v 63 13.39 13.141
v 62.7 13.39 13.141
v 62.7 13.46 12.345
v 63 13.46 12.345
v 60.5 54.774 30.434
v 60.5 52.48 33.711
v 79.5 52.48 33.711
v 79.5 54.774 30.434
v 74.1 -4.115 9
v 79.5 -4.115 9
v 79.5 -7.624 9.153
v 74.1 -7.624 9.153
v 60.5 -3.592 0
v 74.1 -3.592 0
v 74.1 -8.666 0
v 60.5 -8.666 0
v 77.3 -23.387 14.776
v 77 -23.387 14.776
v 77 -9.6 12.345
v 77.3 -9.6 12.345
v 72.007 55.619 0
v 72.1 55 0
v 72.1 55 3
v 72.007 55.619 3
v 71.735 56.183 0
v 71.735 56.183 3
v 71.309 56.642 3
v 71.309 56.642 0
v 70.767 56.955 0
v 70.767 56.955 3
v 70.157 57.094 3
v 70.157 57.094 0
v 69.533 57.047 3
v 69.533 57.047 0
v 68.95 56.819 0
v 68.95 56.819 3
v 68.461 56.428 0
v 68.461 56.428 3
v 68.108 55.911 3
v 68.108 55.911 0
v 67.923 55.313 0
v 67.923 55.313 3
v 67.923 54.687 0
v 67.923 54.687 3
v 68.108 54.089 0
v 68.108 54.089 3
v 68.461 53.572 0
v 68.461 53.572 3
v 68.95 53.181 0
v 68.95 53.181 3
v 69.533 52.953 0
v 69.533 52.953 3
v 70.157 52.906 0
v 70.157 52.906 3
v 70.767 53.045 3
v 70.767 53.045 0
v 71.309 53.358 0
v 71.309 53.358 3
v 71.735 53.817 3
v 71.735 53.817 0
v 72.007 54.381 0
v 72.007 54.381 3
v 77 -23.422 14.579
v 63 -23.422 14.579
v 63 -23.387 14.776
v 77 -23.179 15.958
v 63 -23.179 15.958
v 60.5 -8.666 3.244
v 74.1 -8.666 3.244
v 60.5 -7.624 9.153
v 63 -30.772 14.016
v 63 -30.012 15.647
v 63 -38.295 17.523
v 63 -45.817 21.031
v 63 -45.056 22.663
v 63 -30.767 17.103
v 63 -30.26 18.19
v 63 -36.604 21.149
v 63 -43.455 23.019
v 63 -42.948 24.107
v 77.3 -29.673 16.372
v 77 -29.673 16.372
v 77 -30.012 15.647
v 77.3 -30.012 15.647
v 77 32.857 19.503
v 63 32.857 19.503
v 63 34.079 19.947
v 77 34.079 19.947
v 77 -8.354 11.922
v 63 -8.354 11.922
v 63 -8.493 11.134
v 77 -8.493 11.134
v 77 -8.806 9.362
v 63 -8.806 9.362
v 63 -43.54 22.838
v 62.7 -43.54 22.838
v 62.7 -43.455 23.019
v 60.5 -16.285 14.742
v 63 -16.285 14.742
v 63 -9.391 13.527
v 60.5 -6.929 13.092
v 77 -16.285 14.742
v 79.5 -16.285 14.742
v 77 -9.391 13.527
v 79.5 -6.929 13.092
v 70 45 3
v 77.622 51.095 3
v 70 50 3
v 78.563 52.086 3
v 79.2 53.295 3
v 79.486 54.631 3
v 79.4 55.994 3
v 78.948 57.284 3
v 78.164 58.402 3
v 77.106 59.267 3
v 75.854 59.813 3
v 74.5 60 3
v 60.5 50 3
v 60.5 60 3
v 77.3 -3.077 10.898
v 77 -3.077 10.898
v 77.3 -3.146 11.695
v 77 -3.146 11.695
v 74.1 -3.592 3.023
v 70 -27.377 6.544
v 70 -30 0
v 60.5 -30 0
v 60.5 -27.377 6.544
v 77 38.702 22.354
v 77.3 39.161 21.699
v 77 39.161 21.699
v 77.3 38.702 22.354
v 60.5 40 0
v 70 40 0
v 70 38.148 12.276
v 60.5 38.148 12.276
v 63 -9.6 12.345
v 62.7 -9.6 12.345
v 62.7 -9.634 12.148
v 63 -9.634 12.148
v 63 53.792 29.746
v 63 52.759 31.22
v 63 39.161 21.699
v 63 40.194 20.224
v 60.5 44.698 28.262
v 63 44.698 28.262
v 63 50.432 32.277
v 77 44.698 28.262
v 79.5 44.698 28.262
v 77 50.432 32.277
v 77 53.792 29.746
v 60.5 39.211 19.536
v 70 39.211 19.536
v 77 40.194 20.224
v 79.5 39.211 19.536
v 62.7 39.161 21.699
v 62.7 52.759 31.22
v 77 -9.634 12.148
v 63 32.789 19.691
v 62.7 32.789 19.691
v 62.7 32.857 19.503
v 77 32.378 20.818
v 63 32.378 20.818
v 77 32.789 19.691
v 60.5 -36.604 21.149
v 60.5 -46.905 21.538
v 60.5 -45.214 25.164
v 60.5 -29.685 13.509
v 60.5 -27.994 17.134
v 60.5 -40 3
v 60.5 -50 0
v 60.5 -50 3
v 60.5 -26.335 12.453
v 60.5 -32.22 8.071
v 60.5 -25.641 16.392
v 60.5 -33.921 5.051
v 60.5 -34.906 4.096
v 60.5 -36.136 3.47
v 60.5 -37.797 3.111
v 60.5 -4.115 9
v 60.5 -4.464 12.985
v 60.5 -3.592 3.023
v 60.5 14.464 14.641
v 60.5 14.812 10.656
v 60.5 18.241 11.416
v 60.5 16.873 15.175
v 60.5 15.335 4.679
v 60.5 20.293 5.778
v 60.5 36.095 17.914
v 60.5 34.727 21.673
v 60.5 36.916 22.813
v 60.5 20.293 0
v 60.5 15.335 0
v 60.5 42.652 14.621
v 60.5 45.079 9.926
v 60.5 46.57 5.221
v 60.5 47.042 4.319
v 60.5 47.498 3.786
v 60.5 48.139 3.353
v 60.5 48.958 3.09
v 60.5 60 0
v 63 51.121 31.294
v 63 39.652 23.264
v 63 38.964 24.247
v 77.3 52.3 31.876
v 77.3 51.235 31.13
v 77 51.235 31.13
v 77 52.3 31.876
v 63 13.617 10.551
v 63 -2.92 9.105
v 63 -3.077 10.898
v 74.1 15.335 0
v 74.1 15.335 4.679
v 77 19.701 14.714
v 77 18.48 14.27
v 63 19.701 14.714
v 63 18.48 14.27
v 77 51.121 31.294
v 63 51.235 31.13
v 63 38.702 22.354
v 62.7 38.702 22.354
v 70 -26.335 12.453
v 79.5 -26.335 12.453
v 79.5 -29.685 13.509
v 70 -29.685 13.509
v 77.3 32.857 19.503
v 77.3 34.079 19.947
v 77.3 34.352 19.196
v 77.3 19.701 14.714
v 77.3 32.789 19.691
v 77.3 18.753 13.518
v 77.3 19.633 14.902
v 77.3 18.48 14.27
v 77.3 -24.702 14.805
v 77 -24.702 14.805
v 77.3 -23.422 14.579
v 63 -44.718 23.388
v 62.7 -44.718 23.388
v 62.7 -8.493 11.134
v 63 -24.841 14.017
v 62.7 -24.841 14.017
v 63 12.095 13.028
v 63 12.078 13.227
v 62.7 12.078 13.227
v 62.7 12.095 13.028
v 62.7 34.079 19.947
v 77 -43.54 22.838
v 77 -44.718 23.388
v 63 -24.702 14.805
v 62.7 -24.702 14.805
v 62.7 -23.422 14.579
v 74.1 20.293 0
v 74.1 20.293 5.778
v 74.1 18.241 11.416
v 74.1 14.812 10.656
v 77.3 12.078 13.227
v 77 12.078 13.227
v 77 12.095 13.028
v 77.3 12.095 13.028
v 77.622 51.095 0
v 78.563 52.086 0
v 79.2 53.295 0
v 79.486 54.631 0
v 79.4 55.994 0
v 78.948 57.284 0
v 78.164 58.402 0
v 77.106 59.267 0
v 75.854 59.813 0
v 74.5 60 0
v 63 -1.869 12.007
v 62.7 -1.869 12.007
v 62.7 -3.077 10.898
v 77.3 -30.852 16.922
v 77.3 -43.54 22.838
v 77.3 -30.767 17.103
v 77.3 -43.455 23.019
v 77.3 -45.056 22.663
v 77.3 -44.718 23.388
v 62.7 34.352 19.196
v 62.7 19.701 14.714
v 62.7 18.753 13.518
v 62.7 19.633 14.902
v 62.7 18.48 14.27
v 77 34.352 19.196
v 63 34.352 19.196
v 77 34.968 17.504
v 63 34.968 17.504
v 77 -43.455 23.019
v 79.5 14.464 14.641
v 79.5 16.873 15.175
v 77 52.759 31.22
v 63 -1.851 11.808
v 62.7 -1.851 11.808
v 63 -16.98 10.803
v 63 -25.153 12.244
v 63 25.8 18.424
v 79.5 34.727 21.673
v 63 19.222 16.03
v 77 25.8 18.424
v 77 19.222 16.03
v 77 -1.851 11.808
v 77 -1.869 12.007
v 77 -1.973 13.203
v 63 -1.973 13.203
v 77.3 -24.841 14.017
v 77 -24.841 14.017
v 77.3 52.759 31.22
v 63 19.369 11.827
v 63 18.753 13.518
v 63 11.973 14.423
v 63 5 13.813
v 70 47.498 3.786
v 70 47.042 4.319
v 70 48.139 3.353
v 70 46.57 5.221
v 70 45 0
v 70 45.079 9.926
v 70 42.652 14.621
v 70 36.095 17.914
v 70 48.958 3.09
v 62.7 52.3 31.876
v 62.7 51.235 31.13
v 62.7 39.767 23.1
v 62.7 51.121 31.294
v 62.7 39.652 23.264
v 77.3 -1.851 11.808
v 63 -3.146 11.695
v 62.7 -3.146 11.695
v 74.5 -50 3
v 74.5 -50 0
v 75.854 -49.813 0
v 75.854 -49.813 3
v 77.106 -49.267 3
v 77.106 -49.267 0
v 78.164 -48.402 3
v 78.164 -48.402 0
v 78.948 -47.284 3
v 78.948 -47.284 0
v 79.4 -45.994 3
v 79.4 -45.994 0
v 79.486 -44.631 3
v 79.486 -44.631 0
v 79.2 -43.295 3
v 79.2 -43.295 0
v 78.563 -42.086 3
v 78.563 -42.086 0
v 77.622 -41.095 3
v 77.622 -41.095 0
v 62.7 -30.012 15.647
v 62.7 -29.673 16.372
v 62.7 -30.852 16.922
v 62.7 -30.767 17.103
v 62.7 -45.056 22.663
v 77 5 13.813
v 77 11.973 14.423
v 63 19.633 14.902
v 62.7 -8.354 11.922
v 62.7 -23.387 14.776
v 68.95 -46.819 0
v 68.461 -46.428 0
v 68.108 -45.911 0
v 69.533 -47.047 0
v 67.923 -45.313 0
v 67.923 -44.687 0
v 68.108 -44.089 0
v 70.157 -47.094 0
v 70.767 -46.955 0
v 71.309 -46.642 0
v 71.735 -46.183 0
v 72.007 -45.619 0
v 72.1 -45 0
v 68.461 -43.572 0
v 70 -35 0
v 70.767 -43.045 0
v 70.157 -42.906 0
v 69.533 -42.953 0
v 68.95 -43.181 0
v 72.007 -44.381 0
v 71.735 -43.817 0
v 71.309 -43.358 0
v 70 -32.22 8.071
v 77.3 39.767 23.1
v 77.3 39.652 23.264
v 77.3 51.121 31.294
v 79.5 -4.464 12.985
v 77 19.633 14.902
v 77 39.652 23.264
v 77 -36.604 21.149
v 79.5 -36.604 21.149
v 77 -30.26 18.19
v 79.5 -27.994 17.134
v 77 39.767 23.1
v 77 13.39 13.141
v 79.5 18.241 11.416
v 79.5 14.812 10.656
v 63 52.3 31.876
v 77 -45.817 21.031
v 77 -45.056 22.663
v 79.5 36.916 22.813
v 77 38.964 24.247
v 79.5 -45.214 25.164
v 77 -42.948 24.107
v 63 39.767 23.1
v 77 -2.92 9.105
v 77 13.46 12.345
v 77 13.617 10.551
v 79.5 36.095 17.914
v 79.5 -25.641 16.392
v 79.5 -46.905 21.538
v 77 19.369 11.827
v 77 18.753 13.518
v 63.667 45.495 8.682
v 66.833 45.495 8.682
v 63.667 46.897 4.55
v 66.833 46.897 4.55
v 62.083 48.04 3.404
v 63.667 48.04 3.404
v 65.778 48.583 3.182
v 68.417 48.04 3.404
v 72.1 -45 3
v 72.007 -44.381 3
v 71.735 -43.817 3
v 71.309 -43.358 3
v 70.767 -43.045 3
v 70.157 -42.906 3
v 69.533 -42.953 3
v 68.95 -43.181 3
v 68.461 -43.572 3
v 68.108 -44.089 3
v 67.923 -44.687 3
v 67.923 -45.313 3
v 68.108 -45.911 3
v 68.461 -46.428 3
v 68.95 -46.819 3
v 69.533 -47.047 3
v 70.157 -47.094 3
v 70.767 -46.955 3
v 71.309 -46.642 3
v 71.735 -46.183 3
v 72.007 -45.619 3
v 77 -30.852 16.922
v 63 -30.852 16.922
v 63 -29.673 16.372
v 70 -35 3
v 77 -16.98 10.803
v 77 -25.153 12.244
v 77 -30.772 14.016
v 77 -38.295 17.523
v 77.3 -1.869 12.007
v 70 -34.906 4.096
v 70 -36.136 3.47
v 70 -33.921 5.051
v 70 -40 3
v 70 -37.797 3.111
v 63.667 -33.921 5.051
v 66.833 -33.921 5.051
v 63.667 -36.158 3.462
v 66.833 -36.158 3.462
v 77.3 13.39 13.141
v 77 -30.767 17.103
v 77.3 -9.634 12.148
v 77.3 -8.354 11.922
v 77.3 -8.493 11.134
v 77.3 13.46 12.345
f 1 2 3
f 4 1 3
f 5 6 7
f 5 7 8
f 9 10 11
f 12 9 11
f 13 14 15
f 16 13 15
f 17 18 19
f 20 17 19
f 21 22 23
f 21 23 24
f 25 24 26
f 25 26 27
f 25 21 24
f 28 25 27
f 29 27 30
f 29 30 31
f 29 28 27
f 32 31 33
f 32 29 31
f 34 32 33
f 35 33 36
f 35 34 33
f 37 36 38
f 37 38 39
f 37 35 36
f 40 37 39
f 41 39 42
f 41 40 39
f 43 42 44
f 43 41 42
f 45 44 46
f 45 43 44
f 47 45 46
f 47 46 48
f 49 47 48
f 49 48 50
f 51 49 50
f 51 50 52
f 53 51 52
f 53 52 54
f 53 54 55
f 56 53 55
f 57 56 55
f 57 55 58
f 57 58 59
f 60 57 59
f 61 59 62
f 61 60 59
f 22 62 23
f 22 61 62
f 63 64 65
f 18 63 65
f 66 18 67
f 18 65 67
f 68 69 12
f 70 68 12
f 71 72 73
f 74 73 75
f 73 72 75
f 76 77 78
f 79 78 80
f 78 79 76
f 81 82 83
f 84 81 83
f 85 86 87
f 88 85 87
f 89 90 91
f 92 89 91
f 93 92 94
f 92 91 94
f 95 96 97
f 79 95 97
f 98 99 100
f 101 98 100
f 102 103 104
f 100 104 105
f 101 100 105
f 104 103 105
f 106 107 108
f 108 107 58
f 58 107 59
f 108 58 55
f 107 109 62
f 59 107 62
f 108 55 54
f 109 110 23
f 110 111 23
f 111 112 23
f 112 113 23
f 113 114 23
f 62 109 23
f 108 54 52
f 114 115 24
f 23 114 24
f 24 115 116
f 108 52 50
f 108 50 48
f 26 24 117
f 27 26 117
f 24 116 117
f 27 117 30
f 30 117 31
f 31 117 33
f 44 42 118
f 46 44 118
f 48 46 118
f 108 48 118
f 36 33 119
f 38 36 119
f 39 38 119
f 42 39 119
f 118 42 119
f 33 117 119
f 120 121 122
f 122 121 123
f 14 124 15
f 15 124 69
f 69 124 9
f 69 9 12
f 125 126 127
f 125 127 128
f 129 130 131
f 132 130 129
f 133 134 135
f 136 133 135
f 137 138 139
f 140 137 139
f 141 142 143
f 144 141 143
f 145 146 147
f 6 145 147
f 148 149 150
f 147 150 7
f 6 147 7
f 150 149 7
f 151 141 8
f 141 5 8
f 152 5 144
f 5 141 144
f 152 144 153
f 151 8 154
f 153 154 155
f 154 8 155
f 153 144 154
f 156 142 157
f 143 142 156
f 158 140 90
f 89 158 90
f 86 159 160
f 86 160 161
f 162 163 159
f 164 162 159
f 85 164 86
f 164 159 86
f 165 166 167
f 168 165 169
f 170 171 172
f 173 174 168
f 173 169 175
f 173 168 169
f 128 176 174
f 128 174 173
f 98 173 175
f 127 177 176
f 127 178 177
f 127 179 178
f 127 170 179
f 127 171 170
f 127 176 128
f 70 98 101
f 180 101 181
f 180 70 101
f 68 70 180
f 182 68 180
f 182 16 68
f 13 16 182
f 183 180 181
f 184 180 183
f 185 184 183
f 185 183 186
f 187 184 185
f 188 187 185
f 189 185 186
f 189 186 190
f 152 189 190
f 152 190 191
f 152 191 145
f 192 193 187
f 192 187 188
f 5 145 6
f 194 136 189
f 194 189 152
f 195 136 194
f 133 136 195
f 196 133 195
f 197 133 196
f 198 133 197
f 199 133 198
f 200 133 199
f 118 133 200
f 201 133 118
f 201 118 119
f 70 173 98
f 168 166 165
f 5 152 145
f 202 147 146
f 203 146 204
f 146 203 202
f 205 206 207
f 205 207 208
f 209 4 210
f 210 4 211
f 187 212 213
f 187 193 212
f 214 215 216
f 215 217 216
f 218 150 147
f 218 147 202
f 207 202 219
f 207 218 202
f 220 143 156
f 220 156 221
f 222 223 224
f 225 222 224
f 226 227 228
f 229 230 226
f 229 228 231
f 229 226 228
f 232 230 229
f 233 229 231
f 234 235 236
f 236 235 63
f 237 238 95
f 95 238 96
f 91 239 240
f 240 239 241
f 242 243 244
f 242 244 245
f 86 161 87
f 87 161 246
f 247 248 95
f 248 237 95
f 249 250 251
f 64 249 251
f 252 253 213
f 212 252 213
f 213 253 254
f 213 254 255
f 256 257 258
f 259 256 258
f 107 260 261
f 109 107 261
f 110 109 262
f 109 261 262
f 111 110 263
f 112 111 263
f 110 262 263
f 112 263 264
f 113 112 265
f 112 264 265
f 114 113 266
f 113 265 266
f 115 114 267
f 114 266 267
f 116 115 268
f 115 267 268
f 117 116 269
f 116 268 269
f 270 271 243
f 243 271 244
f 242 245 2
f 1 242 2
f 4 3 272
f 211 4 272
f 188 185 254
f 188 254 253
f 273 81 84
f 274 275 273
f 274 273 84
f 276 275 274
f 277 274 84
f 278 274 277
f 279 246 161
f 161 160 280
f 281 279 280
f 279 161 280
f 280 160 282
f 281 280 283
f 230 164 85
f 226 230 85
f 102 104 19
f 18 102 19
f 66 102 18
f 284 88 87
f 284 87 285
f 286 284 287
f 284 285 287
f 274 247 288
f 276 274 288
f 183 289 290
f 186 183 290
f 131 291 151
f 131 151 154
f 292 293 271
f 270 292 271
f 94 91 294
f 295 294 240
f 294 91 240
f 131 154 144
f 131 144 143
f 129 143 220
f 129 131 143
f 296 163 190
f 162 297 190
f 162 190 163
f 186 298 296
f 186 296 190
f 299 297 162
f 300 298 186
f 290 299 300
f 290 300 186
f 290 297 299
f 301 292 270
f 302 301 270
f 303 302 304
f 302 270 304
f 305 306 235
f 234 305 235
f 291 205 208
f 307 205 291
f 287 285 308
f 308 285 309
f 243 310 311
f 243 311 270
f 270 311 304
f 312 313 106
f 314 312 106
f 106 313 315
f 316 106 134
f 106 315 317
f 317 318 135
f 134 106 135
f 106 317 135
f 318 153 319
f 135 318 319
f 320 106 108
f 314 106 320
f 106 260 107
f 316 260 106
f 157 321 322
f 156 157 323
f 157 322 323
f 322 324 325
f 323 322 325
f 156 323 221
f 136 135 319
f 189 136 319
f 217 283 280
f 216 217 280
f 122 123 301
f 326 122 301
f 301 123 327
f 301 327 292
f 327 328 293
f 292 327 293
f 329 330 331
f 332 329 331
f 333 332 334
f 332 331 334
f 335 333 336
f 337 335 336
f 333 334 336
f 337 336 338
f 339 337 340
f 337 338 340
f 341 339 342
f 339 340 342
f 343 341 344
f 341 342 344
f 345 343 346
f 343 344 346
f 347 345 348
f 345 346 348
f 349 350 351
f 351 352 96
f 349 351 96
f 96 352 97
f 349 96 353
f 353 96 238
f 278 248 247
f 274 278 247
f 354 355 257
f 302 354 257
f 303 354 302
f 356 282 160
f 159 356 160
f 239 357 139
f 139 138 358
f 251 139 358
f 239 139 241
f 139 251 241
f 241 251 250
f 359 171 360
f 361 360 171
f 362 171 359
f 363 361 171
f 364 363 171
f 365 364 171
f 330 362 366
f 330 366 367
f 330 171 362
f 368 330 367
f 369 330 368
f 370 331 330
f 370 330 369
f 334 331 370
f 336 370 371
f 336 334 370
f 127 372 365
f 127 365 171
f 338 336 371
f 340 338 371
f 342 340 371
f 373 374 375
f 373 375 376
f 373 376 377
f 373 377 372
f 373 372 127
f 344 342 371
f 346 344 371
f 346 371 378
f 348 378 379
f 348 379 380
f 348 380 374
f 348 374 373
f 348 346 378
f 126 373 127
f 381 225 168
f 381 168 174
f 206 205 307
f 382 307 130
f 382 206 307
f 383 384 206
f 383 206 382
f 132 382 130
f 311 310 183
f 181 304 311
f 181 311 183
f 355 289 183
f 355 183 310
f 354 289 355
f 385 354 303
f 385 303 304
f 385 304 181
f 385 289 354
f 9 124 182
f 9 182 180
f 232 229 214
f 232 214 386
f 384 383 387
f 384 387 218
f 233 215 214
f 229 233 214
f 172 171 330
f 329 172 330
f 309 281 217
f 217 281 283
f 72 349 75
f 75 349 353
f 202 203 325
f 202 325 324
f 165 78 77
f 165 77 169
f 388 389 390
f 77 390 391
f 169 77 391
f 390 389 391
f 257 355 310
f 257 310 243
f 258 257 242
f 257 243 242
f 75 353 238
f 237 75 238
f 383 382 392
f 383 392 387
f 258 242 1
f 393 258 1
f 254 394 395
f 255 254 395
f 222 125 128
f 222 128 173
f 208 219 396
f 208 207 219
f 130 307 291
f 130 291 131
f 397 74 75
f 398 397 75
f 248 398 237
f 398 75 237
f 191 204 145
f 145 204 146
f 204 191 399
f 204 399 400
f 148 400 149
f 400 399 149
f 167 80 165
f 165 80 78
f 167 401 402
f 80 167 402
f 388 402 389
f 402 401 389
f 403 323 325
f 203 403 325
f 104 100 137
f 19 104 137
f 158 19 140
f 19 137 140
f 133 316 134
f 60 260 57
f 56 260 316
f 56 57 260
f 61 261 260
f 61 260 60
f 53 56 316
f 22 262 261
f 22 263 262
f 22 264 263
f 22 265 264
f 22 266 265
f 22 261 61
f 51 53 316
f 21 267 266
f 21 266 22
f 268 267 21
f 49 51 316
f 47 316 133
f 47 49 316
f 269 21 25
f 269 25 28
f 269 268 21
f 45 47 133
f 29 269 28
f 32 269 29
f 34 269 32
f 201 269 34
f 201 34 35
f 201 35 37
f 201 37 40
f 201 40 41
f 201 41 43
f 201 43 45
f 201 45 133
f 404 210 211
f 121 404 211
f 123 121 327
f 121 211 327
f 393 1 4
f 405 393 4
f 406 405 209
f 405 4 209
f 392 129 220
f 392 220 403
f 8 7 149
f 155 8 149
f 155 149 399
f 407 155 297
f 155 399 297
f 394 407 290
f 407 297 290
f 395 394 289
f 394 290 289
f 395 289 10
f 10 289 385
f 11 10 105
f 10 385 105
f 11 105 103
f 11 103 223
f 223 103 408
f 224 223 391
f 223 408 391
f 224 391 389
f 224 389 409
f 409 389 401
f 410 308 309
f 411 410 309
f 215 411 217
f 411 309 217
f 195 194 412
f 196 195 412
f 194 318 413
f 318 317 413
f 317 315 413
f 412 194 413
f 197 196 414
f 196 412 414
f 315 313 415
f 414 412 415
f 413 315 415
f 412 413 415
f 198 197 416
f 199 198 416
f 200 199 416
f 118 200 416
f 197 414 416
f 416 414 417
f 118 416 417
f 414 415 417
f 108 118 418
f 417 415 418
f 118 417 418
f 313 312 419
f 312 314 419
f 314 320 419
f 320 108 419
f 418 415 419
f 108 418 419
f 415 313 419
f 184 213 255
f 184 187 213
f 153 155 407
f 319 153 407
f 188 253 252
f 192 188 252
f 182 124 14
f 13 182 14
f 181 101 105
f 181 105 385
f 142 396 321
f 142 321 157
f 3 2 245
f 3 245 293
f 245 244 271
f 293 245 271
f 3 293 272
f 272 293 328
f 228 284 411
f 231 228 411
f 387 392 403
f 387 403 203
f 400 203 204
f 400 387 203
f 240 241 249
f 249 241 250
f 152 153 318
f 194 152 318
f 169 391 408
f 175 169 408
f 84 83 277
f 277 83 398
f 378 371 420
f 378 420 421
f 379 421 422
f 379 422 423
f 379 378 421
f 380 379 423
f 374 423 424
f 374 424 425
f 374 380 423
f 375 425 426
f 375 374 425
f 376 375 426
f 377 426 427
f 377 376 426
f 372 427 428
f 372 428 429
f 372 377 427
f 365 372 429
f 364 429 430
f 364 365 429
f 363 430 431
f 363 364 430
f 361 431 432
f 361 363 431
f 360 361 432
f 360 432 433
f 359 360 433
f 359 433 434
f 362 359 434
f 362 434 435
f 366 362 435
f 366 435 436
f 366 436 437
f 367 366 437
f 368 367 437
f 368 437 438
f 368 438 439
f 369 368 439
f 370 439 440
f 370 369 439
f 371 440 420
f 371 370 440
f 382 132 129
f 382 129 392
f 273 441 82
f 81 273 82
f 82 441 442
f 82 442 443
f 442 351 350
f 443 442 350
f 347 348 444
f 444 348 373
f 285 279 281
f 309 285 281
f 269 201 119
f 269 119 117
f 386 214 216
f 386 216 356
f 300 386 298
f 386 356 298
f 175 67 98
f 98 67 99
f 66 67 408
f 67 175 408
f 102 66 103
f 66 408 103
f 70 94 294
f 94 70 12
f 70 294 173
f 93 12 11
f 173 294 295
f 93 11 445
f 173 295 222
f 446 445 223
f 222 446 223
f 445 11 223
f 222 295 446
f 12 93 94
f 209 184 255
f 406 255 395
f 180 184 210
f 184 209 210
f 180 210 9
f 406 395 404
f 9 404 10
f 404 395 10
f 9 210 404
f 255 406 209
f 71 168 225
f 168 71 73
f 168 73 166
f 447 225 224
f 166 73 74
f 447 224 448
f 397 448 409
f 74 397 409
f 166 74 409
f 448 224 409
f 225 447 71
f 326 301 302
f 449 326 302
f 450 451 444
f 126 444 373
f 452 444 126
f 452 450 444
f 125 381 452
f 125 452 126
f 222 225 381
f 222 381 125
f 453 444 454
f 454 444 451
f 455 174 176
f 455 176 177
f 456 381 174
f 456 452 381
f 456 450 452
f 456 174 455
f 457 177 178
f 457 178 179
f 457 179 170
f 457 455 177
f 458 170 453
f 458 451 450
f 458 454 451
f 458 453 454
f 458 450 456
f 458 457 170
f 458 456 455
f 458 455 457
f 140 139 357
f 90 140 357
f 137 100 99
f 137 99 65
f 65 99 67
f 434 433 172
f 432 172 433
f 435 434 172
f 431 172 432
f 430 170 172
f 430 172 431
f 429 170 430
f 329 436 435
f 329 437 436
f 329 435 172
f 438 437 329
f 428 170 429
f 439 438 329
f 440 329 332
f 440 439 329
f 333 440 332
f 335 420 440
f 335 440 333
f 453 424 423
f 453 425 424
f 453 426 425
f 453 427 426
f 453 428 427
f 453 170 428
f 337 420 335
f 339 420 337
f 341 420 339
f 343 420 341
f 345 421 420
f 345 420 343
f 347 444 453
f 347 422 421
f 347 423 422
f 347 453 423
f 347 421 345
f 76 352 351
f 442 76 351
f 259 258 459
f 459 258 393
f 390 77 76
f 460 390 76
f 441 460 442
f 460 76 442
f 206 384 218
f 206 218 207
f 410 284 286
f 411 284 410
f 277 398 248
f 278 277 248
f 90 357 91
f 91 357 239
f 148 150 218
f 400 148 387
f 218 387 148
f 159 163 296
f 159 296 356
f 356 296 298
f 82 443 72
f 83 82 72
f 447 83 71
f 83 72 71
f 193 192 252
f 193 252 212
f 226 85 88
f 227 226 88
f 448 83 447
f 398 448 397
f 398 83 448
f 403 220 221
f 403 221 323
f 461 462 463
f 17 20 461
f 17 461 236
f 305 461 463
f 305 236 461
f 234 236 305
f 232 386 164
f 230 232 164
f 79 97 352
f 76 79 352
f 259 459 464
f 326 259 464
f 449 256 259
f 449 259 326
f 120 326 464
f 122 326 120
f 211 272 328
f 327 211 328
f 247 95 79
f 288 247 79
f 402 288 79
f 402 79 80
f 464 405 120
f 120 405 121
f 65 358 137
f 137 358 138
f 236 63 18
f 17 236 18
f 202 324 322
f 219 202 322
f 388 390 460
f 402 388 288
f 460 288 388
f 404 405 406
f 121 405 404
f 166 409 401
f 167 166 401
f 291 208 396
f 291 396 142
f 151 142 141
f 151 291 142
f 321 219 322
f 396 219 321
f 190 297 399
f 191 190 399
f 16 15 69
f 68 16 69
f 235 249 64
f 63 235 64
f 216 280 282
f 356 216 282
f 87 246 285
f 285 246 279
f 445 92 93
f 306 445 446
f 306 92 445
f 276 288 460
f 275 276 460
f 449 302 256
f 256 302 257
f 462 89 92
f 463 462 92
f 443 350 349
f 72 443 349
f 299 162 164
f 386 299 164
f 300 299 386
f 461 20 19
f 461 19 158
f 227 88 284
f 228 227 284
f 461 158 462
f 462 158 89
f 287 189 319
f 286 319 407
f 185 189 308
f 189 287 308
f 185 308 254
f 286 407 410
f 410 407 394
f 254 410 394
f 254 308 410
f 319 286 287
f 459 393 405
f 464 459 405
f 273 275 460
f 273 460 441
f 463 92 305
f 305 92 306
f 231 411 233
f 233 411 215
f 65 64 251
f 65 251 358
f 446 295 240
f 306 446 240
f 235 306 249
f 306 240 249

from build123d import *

# Parameters (mm, degrees)
PAD012_DEPTH      = 9.5
POCKET006_DEPTH   = 7
POCKET007_DEPTH   = 7.3
PAD013_DEPTH      = 4.1
PAD013_DEPTH_BACK = 9.5
PAD014_DEPTH      = 9.5
SKETCH025_R       = 2.1
PAD015_DEPTH      = 3


with BuildPart() as part:
    # Sketch020 → Pad012 (new body, symmetric)
    with BuildSketch(Plane.YZ):
        Polygon((-50.2140974459, 25.1635701277), (-41.604173469, 21.1486966411), (-32.9942494922, 17.1338231546), (-30.6406576873, 16.391738509), (-21.2849840337, 14.7420808212), (-11.9293103801, 13.0924231333), (-9.4638496319, 12.9847787924), (0, 13.8127583485), (9.4638496319, 14.6407379046), (11.8731622478, 15.1748696522), (20.8002421453, 18.4240610138), (29.7273220428, 21.6732523754), (31.9162958532, 22.8127600156), (39.698240274, 28.2617361609), (47.4801846947, 33.7107123063), (49.7744904401, 30.4341041291), (34.2106015986, 19.5361518385), (31.0954026161, 17.9144818922), (13.2412428211, 11.416099169), (9.8124726029, 10.6559591122), (-9.1152266609, 9), (-12.6239030908, 9.1531921213), (-31.335250398, 12.452507497), (-34.6847225392, 13.5085920065), (-51.9045704929, 21.5383389795), align=None)
    extrude(amount=PAD012_DEPTH, both=True)

    # Sketch021 → Pocket006 (cut, symmetric)
    with BuildSketch(Plane.YZ):
        Polygon((-47.9483279783, 24.1070244733), (-41.604173469, 21.1486966411), (-35.2600189598, 18.190368809), (-35.8516845262, 16.9215379071), (-34.6734844031, 16.3721341668), (-35.7722918836, 14.0157339205), (-43.294646516, 17.523465493), (-50.8170011484, 21.0311970654), (-49.7181936679, 23.3875973117), (-48.5399935447, 22.8381935715), align=None)
        Polygon((-30.1534810944, 12.2441296838), (-29.7019958324, 14.8046298416), (-28.4217457535, 14.5788872106), (-28.1786383048, 15.9576180648), (-21.2849840337, 14.7420808212), (-14.3913297626, 13.5265435775), (-14.6344372114, 12.1478127233), (-13.3541871324, 11.9220700923), (-13.8056723944, 9.3615699345), (-21.9795767444, 10.8028498091), align=None)
        Polygon((-8.1463979543, 11.6946931063), (-6.8513448468, 11.8079955719), (-6.9733628866, 13.2026681492), (0, 13.8127583485), (6.9733628866, 14.4228485477), (7.0953809265, 13.0281759704), (8.390434034, 13.1414784359), (8.6170389652, 10.5513722209), (0.348622971, 9.8279795561), (-7.9197930232, 9.1045868913), align=None)
        Polygon((14.2223937998, 16.0299200105), (20.8002421453, 18.4240610138), (27.3780904908, 20.818202017), (27.8569186914, 19.5026323479), (29.0785190985, 19.9472585343), (29.9677714711, 17.5040577202), (22.1683227186, 14.6652905306), (14.3688739661, 11.826523341), (13.4796215934, 14.2697241551), (14.7012220004, 14.7143503414), align=None)
        Polygon((33.7022853173, 22.3542388772), (34.7671829748, 23.0998882445), (33.964175964, 24.2467011065), (39.698240274, 28.2617361609), (45.432304584, 32.2767712154), (46.2353115949, 31.1299583534), (47.3002092525, 31.8756077207), (48.791507987, 29.7458124055), (41.9925460194, 24.9851279838), (35.1935840518, 20.2244435621), align=None)
    extrude(amount=POCKET006_DEPTH, both=True, mode=Mode.SUBTRACT)

    # Sketch022 → Pocket007 (cut, symmetric)
    with BuildSketch(Plane.YZ):
        Polygon((-48.4554698924, 23.0194551289), (-35.7671608739, 17.1027994645), (-35.8516845262, 16.9215379071), (-34.6734844031, 16.3721341668), (-35.0115790125, 15.6470879372), (-50.0562882773, 22.6625510822), (-49.7181936678, 23.3875973117), (-48.5399935447, 22.8381935715), align=None)
        Polygon((-28.387016118, 14.7758487612), (-14.5997075758, 12.3447742739), (-14.6344372114, 12.1478127233), (-13.3541871325, 11.9220700923), (-13.4931056746, 11.1342238899), (-29.8409143746, 14.0167836392), (-29.7019958324, 14.8046298416), (-28.4217457535, 14.5788872107), align=None)
        Polygon((-6.8687759954, 12.0072345116), (7.077949778, 13.2274149099), (7.0953809265, 13.0281759703), (8.390434034, 13.1414784359), (8.4601586282, 12.3445226773), (-8.0766733601, 10.8977373481), (-8.1463979543, 11.6946931063), (-6.8513448468, 11.8079955719), align=None)
        Polygon((14.6328179716, 14.9022888661), (27.788514663, 19.6905708716), (27.8569186915, 19.5026323479), (29.0785190985, 19.9472585342), (29.3521352133, 19.1955044372), (13.7532377079, 13.5179700589), (13.4796215934, 14.269724155), (14.7012220005, 14.7143503413), align=None)
        Polygon((34.6524676876, 23.2637186533), (46.1205963076, 31.2937887623), (46.2353115949, 31.1299583534), (47.3002092525, 31.8756077206), (47.7590704015, 31.2202860852), (34.1611464664, 21.6989172418), (33.7022853173, 22.3542388772), (34.7671829749, 23.0998882444), align=None)
    extrude(amount=POCKET007_DEPTH, both=True, mode=Mode.SUBTRACT)

    # Sketch023 → Pad013 (join, two sides)
    with BuildSketch(Plane.YZ) as pad013_sk:
        Polygon((-11.9293103801, 13.0924231333), (-9.4638496319, 12.9847787924), (-9.1152266609, 9), (-8.5922922044, 3.0228318114), (-8.5922922044, 0), (-13.6657921568, 0), (-13.6657921568, 3.2443456032), (-12.6239030908, 9.1531921213), align=None)
        Polygon((9.8124726029, 10.6559591122), (9.4638496319, 14.6407379046), (11.8731622478, 15.1748696522), (13.2412428211, 11.416099169), (15.2933636811, 5.7779434443), (15.2933636811, 0), (10.3354070593, 0), (10.3354070593, 4.6787909237), align=None)
    extrude(amount=PAD013_DEPTH)
    extrude(pad013_sk.sketch, amount=-PAD013_DEPTH_BACK)

    # Sketch024 → Pad014 (join)
    with BuildSketch(Plane.YZ):
        with BuildLine():
            Line((-45, 0), (-35, 0))
            Line((-35, 0), (-32.377139464, 6.5436609789))
            Line((-32.377139464, 6.5436609789), (-31.335250398, 12.452507497))
            Line((-31.335250398, 12.452507497), (-30.6406576873, 16.391738509))
            Line((-30.6406576873, 16.391738509), (-32.9942494922, 17.1338231546))
            Line((-32.9942494922, 17.1338231546), (-34.6847225392, 13.5085920065))
            Line((-34.6847225392, 13.5085920065), (-37.2204321096, 8.0707452842))
            add(Edge.make_bspline(
                [(-37.2204321096, 8.0707452842), (-39.0096732627, 4.233705249), (-40, 3), (-45, 3)],
                knots=[0, 0, 0, 0, 1, 1, 1, 1], degree=3))
            Line((-45, 3), (-45, 0))
        make_face()
        with BuildLine():
            Line((45, 3), (45, 0))
            Line((45, 0), (35, 0))
            Line((35, 0), (33.147523476, 12.2763261675))
            Line((33.147523476, 12.2763261675), (31.0954026161, 17.9144818922))
            Line((31.0954026161, 17.9144818922), (29.7273220428, 21.6732523754))
            Line((29.7273220428, 21.6732523754), (31.9162958532, 22.8127600156))
            Line((31.9162958532, 22.8127600156), (34.2106015986, 19.5361518385))
            Line((34.2106015986, 19.5361518385), (37.6520602167, 14.6212395727))
            add(Edge.make_bspline(
                [(37.6520602167, 14.6212395727), (42.2621193459, 8.0373928164), (40, 3), (45, 3)],
                knots=[0, 0, 0, 0, 1, 1, 1, 1], degree=3))
        make_face()
    extrude(amount=-PAD014_DEPTH)

    # Sketch025 → Pad015 (join)
    with BuildSketch(Plane.XY):
        with BuildLine():
            Line((0, 45), (-9.5, 45))
            Line((-9.5, 45), (-9.5, 55))
            Line((-9.5, 55), (4.5, 55))
            ThreePointArc((7.6224992299, 46.0948753465), (9.218348401, 51.6544450327), (4.5, 55))
            Line((7.6224992299, 46.0948753465), (0, 40))
            Line((0, 45), (0, 40))
        make_face()
        with Locations((0, 50)):
            Circle(SKETCH025_R, mode=Mode.SUBTRACT)
        with BuildLine():
            Line((0, -45), (-9.5, -45))
            Line((-9.5, -45), (-9.5, -55))
            Line((-9.5, -55), (4.5, -55))
            ThreePointArc((4.5, -55), (9.218348401, -51.6544450327), (7.6224992299, -46.0948753465))
            Line((7.6224992299, -46.0948753465), (0, -40))
            Line((0, -40), (0, -45))
        make_face()
        with Locations((0, -50)):
            Circle(SKETCH025_R, mode=Mode.SUBTRACT)
    extrude(amount=PAD015_DEPTH)


with BuildPart() as part_1:
    # Body003 placement: moved
    add(part.part.moved(Location((70, 5, 0))))


solid = part_1.part
